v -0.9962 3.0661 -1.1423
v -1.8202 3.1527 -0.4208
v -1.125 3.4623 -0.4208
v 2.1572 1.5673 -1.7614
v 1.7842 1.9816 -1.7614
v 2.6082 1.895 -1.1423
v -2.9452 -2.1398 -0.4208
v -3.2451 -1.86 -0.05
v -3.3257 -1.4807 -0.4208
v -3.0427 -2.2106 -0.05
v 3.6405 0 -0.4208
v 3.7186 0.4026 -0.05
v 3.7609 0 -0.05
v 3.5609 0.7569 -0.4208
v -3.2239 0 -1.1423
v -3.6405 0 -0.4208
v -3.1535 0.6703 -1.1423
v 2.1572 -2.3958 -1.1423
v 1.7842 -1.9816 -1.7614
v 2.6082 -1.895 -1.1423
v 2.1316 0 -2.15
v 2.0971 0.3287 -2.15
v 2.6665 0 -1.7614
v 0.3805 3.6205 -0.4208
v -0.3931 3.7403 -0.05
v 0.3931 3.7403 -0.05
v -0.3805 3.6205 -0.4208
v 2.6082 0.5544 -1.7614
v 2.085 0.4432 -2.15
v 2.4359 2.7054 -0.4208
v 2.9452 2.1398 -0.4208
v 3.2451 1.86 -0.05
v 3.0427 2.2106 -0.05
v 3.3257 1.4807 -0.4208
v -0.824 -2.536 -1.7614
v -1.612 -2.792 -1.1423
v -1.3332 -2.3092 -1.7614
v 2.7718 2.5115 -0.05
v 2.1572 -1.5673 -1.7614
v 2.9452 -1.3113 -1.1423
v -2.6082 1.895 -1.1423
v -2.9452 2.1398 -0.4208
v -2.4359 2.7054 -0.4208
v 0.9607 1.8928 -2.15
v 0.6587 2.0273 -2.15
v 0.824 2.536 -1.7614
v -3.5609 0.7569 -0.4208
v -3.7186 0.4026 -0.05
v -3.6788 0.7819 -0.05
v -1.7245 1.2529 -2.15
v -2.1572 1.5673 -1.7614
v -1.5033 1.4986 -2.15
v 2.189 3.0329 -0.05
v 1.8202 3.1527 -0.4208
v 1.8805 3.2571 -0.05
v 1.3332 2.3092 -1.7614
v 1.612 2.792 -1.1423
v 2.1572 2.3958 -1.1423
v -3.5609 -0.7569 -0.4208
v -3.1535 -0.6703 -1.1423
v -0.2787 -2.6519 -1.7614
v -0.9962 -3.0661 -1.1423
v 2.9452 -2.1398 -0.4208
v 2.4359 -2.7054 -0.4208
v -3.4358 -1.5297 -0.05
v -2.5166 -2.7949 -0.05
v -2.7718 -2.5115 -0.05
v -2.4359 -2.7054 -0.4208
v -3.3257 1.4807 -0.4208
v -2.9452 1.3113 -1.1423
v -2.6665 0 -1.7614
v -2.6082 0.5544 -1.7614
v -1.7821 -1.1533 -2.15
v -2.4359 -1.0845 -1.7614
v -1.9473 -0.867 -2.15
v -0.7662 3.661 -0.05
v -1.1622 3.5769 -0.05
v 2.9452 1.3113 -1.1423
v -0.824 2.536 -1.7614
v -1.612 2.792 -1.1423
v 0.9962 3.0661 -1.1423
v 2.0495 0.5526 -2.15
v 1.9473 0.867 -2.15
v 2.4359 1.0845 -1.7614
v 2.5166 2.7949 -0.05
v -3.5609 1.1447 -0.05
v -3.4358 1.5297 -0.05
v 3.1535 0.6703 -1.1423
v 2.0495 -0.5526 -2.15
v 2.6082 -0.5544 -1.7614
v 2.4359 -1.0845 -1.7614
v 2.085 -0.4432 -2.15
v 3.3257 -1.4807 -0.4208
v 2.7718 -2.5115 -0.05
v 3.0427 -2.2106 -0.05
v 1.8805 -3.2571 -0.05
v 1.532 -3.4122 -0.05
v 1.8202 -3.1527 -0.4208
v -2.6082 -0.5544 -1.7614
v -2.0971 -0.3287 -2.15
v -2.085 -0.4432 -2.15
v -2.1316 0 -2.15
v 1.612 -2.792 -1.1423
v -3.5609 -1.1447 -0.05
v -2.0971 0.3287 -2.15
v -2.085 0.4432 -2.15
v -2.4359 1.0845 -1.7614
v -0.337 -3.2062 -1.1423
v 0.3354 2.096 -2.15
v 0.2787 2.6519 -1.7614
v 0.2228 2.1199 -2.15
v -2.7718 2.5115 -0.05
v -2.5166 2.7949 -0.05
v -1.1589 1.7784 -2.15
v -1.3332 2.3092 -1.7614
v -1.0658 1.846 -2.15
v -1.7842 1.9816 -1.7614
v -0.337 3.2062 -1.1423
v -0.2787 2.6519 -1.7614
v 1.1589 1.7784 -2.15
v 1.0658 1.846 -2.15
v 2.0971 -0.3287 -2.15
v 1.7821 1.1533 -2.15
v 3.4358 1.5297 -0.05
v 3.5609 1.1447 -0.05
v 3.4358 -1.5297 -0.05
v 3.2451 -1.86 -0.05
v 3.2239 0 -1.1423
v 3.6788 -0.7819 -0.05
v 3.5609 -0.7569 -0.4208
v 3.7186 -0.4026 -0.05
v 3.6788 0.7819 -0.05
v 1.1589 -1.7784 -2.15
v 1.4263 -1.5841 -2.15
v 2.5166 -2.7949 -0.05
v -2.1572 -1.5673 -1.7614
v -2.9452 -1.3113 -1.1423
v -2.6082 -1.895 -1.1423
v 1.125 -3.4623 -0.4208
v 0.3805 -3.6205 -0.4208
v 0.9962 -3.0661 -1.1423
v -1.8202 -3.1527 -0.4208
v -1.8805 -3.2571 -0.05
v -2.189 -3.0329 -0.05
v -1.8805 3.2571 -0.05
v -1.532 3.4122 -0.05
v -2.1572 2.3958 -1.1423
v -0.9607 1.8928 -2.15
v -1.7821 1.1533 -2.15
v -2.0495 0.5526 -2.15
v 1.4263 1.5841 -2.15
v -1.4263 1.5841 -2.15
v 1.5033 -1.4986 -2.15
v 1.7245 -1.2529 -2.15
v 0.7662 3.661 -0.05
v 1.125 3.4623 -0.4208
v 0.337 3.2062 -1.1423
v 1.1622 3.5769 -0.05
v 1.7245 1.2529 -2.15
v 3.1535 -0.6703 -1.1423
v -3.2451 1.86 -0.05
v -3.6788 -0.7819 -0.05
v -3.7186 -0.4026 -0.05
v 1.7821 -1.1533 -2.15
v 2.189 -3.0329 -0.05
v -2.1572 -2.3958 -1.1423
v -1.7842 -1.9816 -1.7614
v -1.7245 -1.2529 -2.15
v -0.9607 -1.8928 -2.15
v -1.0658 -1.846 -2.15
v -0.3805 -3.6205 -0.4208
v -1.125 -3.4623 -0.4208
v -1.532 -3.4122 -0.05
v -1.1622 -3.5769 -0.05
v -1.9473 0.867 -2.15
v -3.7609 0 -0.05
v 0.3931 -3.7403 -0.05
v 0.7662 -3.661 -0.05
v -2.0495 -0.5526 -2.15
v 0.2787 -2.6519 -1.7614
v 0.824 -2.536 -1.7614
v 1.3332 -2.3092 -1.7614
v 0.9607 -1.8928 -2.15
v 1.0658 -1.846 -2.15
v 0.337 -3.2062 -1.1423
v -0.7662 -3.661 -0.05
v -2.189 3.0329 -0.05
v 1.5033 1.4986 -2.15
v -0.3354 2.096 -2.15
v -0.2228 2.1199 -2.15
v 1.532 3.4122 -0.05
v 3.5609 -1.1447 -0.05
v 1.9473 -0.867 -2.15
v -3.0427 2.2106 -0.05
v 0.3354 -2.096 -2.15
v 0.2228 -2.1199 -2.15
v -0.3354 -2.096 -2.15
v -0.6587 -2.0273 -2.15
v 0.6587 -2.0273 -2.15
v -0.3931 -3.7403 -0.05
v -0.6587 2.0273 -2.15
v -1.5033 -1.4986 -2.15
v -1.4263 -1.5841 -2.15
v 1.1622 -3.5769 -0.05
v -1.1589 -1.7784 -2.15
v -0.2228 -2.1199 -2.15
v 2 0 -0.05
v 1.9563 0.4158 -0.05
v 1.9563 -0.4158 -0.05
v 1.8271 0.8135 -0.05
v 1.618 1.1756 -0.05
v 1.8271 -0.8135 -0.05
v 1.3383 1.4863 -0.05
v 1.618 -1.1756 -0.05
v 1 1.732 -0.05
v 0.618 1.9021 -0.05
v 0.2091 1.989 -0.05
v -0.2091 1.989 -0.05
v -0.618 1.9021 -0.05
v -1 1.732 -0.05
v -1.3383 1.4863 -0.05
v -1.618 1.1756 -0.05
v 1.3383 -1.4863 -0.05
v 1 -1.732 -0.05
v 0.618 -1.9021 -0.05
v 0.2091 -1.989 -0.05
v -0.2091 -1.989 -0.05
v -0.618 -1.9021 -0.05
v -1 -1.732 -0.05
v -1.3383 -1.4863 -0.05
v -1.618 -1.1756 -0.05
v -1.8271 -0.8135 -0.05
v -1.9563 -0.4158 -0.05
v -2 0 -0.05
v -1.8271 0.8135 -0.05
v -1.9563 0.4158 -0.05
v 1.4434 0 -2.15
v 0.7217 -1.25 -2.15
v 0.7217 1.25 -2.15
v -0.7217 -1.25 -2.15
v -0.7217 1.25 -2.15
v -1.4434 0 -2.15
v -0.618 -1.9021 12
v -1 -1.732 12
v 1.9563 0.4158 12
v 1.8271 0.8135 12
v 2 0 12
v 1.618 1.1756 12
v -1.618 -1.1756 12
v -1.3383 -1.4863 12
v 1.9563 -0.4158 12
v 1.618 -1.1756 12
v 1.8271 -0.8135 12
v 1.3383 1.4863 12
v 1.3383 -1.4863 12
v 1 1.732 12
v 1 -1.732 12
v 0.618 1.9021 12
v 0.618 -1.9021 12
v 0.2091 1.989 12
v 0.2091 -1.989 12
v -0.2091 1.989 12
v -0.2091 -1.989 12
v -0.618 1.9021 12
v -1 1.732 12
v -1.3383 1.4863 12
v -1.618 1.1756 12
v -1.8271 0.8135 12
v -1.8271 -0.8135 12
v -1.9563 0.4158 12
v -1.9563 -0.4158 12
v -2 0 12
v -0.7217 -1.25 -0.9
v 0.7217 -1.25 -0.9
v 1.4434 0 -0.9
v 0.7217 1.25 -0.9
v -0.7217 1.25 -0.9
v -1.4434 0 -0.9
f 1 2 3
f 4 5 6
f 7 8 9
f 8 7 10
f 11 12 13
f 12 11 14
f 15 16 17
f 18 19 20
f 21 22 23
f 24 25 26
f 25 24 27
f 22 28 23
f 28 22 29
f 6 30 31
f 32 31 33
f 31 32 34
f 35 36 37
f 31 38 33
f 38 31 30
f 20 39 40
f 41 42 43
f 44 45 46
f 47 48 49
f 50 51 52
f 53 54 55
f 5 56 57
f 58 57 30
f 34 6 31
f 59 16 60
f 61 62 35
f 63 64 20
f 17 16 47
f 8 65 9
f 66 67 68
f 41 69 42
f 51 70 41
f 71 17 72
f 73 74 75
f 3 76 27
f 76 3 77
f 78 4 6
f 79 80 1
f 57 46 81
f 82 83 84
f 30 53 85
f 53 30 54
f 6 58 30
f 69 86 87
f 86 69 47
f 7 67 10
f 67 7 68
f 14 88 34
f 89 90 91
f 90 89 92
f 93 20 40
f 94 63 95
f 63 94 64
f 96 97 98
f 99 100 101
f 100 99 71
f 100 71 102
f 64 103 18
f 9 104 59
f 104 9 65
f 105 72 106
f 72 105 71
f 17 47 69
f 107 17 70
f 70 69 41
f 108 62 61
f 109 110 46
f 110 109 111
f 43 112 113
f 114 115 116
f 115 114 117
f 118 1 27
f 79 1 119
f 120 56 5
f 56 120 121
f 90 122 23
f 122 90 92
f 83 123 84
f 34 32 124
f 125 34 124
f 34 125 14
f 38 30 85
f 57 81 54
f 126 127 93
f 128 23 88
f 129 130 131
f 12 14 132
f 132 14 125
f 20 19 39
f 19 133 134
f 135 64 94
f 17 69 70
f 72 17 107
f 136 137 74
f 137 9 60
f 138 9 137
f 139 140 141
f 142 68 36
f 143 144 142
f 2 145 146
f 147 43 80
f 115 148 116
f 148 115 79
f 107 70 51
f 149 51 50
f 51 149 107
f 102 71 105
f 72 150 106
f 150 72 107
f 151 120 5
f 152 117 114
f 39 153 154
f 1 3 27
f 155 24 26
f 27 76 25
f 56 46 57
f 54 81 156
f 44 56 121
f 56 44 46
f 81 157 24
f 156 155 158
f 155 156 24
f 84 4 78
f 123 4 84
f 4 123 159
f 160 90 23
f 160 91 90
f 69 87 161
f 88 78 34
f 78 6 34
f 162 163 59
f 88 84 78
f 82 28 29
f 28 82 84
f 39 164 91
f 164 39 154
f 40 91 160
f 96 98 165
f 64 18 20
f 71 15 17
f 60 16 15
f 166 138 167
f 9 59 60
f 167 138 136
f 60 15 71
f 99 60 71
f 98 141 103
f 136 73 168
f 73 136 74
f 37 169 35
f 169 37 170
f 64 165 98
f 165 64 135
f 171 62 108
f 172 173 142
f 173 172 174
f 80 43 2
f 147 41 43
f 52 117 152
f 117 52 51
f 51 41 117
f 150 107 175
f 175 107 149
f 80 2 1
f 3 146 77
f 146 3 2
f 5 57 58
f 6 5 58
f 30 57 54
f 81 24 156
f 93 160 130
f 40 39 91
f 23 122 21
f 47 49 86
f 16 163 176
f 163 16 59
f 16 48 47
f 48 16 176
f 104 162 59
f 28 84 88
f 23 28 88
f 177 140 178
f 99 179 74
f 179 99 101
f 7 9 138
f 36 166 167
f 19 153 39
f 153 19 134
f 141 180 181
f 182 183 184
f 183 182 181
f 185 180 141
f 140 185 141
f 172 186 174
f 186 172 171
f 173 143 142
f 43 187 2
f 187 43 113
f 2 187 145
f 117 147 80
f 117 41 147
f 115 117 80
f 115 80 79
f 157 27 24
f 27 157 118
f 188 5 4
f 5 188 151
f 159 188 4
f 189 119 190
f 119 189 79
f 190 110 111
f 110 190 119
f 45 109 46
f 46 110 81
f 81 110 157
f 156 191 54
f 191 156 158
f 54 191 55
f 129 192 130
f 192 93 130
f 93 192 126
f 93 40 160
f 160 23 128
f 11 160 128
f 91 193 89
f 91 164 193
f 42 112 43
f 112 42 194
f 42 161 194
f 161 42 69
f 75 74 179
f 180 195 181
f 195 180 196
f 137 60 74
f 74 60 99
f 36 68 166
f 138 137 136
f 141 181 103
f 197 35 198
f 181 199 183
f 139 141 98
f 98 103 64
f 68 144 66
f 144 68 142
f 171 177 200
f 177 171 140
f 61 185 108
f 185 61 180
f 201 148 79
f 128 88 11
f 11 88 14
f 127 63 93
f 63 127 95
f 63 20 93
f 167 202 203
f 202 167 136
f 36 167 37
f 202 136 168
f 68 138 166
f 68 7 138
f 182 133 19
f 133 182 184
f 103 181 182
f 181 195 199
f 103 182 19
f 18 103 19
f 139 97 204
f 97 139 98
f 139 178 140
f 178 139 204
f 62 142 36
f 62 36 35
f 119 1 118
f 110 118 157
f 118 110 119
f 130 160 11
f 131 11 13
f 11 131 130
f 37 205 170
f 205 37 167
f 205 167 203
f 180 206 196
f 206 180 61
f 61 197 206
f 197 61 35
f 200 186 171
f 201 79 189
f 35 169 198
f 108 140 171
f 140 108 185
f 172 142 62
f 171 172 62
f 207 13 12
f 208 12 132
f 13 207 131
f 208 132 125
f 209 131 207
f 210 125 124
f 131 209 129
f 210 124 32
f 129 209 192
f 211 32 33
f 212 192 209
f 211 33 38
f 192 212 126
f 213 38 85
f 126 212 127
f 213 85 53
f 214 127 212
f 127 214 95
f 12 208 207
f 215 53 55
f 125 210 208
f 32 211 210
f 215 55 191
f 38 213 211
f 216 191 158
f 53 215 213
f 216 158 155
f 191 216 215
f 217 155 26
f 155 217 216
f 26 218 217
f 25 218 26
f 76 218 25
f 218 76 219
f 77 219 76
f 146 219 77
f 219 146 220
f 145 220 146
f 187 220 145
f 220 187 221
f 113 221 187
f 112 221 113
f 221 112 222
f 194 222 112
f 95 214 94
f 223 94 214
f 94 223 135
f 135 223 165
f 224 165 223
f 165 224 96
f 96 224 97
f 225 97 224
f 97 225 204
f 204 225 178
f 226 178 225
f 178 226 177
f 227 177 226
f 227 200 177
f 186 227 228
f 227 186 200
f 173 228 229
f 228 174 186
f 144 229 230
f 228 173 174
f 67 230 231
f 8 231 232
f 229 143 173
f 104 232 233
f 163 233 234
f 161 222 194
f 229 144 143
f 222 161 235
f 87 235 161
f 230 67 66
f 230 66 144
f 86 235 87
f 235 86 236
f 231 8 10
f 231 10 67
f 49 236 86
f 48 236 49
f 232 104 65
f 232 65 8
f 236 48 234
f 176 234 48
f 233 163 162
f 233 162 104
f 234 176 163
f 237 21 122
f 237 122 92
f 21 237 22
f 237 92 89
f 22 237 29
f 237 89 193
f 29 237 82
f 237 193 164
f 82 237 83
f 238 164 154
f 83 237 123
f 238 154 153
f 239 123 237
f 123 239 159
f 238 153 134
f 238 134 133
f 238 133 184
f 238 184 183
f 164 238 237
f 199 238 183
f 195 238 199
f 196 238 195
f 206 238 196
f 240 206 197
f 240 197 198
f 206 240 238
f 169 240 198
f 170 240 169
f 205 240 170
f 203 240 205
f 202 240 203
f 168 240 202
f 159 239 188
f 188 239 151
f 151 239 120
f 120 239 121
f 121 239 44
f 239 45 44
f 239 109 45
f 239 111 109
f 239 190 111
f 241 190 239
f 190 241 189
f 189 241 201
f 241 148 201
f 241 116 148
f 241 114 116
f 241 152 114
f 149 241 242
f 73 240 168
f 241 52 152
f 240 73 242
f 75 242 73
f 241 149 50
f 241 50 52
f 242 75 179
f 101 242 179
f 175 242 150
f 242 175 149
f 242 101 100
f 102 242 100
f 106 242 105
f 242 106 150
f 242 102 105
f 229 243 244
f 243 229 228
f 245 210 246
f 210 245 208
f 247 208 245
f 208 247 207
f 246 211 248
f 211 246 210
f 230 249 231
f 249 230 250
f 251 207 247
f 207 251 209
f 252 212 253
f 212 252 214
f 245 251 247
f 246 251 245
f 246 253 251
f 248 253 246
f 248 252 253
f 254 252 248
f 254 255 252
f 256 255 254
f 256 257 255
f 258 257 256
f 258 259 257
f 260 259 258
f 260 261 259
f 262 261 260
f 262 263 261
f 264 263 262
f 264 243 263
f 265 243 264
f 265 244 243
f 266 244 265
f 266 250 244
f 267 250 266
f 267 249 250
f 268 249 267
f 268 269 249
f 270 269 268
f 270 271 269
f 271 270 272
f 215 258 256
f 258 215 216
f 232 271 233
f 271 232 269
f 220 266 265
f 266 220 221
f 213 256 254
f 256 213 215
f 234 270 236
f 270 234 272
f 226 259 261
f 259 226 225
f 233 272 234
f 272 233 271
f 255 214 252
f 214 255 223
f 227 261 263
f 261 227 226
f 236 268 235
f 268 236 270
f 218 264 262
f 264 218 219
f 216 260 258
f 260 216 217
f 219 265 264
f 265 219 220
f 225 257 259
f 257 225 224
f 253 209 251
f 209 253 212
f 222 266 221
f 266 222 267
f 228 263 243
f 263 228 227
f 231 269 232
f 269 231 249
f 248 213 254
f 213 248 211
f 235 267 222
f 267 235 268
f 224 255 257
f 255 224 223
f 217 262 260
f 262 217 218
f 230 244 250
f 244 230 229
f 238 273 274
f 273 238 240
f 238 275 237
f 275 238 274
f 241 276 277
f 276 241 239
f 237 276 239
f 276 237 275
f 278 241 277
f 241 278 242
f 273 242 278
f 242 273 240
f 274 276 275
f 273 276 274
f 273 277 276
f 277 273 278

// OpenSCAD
/*
   Copyright 2018 Scott Bezek and the splitflap contributors

   Licensed under the Apache License, Version 2.0 (the "License");
   you may not use this file except in compliance with the License.
   You may obtain a copy of the License at

       http://www.apache.org/licenses/LICENSE-2.0

   Unless required by applicable law or agreed to in writing, software
   distributed under the License is distributed on an "AS IS" BASIS,
   WITHOUT WARRANTIES OR CONDITIONS OF ANY KIND, either express or implied.
   See the License for the specific language governing permissions and
   limitations under the License.
*/

module roughM4_7380(length) {
    eps = 0.1;
    thread_diameter = 4;
    head_diameter = 7.6;
    head_length = 2.2;
    driving_depth = 1.3;
    driving_apothem = 2.5/2;
    driving_radius = driving_apothem / cos(180/6);

    sphere_offset = 1.2;  // Just a guess
    sphere_radius = sqrt(sphere_offset*sphere_offset + (head_diameter/2)*(head_diameter/2));


    difference() {
        union() {
            translate([0, 0, -eps]) {
                cylinder(h=length+eps, d=thread_diameter, $fn=30);
            }
            difference() {
                translate([0, 0, sphere_offset]) {
                    sphere(sphere_radius, $fn=30);
                }
                translate([0, 0, sphere_radius]) {
                    cube([sphere_radius*2 + eps, sphere_radius*2 + eps, sphere_radius*2 + eps], center=true);
                }
                translate([0, 0, -sphere_radius - head_length]) {
                    cube([sphere_radius*2 + eps, sphere_radius*2 + eps, sphere_radius*2 + eps], center=true);
                }
            }
        }
        translate([0, 0, -head_length-eps]) {
            cylinder(h=driving_depth+eps, r=driving_radius, $fn=6);
        }
    }
}

roughM4_7380(12);
